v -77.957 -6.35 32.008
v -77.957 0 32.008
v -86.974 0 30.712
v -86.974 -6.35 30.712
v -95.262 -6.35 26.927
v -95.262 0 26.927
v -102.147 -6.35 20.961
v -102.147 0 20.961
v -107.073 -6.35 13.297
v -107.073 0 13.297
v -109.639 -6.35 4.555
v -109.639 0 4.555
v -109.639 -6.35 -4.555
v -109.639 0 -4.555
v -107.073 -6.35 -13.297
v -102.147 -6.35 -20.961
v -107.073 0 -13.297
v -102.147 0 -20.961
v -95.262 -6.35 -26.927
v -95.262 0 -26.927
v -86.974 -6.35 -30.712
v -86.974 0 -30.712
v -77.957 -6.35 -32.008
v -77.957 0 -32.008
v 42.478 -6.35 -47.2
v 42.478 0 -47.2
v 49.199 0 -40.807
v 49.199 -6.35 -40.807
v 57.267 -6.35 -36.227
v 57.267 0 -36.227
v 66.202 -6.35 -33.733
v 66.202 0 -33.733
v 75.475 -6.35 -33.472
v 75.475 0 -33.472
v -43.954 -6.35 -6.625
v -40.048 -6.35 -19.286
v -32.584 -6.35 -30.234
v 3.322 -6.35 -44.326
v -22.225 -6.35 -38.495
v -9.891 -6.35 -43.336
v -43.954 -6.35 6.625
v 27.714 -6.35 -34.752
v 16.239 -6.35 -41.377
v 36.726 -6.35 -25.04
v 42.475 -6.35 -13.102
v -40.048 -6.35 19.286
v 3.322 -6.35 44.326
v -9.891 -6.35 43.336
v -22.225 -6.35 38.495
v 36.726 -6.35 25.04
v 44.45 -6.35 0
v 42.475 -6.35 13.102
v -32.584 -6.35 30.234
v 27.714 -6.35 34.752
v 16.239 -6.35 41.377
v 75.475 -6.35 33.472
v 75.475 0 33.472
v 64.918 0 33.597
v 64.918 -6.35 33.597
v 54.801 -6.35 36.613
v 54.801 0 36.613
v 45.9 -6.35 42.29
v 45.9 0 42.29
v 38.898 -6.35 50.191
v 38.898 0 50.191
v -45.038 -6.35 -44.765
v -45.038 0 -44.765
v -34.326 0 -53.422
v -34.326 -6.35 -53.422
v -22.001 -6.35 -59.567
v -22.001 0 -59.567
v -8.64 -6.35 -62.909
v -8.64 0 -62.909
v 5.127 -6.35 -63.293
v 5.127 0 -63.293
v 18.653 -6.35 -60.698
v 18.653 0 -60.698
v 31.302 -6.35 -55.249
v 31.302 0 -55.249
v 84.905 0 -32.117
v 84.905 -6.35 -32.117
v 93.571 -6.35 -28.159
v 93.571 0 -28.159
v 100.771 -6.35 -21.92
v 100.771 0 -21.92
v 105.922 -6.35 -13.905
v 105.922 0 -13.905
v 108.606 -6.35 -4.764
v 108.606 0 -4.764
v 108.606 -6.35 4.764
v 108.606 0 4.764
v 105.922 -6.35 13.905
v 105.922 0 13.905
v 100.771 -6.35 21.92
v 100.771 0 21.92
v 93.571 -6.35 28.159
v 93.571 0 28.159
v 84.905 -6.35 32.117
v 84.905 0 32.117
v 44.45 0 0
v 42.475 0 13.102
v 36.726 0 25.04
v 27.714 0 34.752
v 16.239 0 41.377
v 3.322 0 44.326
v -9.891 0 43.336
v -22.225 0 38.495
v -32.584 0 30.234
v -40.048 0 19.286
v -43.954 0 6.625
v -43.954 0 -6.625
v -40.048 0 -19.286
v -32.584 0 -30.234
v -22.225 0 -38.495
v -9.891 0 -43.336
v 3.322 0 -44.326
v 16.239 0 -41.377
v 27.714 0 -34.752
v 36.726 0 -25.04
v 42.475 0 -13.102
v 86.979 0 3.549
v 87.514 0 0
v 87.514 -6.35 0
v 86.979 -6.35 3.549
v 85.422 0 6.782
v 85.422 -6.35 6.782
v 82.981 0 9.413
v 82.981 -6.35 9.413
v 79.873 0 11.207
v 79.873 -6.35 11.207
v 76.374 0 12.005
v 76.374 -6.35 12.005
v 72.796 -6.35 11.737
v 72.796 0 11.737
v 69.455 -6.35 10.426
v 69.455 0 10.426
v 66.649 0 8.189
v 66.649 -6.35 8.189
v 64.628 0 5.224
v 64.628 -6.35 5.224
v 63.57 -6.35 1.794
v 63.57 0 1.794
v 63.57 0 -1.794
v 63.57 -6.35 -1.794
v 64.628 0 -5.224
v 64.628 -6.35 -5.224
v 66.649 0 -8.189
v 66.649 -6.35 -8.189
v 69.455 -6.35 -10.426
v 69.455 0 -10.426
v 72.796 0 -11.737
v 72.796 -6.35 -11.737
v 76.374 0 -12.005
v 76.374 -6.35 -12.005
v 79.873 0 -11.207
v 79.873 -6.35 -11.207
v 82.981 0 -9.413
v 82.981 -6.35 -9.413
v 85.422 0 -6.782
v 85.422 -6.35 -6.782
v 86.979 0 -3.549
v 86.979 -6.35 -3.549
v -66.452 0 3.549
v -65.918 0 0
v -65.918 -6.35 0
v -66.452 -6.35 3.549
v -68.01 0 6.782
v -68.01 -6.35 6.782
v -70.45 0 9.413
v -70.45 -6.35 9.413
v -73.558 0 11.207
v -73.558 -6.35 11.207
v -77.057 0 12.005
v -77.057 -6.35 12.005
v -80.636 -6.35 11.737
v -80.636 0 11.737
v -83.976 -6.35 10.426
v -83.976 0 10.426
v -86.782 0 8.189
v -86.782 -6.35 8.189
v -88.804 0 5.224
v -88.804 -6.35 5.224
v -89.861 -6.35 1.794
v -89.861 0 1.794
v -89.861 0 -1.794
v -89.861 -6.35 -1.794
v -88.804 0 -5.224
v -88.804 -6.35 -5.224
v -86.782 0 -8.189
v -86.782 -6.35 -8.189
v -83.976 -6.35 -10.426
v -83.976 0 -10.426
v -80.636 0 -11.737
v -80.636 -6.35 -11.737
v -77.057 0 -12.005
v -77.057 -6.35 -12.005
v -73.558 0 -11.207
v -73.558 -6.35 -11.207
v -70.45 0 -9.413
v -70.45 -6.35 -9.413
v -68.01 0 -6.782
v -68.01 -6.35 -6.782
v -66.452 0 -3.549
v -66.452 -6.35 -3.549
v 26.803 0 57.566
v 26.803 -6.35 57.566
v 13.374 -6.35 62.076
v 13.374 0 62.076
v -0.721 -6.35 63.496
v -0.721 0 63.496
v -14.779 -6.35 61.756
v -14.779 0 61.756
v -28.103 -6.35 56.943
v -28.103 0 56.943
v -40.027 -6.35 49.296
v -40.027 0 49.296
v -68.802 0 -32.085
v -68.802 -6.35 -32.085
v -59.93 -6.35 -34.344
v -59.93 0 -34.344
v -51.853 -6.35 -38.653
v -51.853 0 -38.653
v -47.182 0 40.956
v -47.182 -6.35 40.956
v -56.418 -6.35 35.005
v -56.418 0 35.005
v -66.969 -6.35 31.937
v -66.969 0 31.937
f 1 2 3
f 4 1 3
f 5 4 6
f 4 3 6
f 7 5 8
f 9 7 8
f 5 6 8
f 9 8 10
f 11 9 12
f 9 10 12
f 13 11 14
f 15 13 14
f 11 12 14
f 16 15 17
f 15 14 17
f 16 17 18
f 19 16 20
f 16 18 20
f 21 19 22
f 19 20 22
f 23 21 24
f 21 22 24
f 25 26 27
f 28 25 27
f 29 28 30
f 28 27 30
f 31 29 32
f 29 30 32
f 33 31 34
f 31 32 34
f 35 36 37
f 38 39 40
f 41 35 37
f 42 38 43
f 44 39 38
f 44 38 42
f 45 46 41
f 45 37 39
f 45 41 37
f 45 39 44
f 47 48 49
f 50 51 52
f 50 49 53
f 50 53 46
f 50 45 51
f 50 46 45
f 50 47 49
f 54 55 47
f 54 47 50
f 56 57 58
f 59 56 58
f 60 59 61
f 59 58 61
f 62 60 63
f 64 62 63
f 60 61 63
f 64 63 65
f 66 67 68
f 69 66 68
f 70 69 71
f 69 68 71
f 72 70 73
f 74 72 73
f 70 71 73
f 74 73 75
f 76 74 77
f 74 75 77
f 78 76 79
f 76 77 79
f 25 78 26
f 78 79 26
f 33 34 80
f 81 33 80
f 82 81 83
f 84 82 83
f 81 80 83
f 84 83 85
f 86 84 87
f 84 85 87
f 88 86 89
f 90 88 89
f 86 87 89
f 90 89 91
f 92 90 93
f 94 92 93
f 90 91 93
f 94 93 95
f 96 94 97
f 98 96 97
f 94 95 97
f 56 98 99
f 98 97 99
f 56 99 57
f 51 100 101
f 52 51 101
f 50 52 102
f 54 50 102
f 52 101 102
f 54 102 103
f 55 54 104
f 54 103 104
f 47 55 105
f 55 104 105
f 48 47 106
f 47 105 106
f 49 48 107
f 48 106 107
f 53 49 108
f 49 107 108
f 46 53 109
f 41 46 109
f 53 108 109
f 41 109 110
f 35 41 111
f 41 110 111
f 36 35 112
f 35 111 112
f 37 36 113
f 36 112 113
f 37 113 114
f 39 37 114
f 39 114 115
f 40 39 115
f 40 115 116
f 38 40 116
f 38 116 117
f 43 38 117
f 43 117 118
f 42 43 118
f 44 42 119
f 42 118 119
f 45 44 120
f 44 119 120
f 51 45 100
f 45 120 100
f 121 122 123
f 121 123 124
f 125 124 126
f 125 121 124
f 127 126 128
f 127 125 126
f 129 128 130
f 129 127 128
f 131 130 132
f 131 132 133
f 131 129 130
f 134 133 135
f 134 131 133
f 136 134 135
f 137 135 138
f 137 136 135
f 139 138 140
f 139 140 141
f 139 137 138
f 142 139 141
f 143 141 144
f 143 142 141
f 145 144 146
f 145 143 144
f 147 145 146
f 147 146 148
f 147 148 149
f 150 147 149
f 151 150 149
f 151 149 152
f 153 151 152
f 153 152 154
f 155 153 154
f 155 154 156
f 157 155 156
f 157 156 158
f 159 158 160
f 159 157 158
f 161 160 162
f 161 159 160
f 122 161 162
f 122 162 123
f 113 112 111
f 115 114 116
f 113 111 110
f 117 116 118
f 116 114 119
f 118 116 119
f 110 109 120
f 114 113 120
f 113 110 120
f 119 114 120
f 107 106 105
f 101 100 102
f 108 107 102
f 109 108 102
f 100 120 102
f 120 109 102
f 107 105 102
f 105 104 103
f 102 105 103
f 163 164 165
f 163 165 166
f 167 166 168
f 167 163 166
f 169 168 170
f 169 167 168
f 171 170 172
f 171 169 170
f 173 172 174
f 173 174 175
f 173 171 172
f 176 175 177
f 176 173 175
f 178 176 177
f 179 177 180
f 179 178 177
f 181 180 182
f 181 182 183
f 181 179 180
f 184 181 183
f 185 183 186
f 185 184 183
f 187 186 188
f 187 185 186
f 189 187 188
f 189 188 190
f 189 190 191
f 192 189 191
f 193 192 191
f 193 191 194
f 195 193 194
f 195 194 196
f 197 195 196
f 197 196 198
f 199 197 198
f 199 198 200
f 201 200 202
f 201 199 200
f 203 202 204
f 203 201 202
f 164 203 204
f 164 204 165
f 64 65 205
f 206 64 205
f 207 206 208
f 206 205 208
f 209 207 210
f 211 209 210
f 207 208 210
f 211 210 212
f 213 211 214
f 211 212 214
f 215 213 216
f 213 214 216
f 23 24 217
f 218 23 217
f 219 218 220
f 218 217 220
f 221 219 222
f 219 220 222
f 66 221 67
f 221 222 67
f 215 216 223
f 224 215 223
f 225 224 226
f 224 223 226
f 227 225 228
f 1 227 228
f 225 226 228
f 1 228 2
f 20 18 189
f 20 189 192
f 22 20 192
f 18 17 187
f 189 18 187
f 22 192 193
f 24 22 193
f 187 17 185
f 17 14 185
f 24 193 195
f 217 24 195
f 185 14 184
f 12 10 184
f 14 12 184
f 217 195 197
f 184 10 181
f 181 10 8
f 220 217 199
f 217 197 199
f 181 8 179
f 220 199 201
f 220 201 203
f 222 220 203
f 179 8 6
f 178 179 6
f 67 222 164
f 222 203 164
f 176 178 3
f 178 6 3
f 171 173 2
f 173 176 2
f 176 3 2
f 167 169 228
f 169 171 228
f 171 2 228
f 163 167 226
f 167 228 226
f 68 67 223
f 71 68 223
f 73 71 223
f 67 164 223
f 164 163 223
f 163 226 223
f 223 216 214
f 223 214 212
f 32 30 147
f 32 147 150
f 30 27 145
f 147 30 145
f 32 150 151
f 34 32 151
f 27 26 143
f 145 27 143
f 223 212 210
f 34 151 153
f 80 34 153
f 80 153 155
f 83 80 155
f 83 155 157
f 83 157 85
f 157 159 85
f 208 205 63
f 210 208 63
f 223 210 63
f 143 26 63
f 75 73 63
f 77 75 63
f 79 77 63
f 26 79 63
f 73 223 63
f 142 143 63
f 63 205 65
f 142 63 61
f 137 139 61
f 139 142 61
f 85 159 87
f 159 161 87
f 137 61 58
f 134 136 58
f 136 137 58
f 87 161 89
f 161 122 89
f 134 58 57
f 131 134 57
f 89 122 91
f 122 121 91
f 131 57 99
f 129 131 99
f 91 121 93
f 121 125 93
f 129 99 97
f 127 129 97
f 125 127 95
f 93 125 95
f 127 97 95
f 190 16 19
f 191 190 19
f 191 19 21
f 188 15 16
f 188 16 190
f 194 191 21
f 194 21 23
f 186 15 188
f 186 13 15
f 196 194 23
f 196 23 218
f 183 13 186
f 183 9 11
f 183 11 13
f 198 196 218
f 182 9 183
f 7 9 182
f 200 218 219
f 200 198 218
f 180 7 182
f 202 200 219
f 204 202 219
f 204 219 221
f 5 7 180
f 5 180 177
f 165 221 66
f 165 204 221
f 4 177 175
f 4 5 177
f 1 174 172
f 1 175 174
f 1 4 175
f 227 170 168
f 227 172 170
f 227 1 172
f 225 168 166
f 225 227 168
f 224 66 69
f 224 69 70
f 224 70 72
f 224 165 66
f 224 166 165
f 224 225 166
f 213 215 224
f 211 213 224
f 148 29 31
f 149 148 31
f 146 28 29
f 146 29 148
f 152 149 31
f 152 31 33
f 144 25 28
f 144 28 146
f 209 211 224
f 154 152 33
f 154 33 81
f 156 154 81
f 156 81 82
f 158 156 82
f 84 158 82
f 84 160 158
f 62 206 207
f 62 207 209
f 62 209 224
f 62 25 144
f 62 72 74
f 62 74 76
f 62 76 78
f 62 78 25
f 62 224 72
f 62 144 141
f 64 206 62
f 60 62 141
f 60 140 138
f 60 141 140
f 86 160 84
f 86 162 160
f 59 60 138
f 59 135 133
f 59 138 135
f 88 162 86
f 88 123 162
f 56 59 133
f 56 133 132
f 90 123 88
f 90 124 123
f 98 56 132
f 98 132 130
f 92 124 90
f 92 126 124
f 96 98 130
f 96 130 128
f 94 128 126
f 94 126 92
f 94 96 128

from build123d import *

# Parameters (mm, degrees)
F0_R     = 44.45
F2_DEPTH = 6.35
F1_R     = 12.0390740619


with BuildPart() as f2:
    # F0 (on Front) → F2 (new body)
    with BuildSketch(Plane.XZ):
        Circle(F0_R)
    extrude(amount=F2_DEPTH)


with BuildPart() as f2b:
    # F1 (on Front) → F2, piece 2 (new body)
    with BuildSketch(Plane.XZ):
        with BuildLine():
            ThreePointArc((75.4746268347, 33.4723664156), (54.8008501345, 36.612828573), (38.8982994904, 50.1913567933))
            ThreePointArc((38.8982994904, 50.1913567933), (-0.7205293928, 63.4959119739), (-40.0272442255, 49.2957373381))
            ThreePointArc((-40.0272442255, 49.2957373381), (-56.418205053, 35.0050977481), (-77.9566796609, 32.0084182016))
            ThreePointArc((-77.9566796609, 32.0084182016), (-109.9650978625, 0), (-77.9566796609, -32.0084182016))
            ThreePointArc((-77.9566796609, -32.0084182016), (-59.9304514247, -34.343511035), (-45.0375494063, -44.7645969877))
            ThreePointArc((-45.0375494063, -44.7645969877), (-1.7667587777, -63.4754170008), (42.4778166696, -47.2004776563))
            ThreePointArc((42.4778166696, -47.2004776563), (57.2667213903, -36.2274766808), (75.4746268347, -33.4723664156))
            ThreePointArc((75.4746268347, -33.4723664156), (108.9469932503, 0), (75.4746268347, 33.4723664156))
        make_face()
        with Locations((-77.9566796609, 0)):
            Circle(F1_R, mode=Mode.SUBTRACT)
        with Locations((75.4746268347, 0)):
            Circle(F1_R, mode=Mode.SUBTRACT)
    extrude(amount=F2_DEPTH)


solid = Compound([f2.part, f2b.part])
